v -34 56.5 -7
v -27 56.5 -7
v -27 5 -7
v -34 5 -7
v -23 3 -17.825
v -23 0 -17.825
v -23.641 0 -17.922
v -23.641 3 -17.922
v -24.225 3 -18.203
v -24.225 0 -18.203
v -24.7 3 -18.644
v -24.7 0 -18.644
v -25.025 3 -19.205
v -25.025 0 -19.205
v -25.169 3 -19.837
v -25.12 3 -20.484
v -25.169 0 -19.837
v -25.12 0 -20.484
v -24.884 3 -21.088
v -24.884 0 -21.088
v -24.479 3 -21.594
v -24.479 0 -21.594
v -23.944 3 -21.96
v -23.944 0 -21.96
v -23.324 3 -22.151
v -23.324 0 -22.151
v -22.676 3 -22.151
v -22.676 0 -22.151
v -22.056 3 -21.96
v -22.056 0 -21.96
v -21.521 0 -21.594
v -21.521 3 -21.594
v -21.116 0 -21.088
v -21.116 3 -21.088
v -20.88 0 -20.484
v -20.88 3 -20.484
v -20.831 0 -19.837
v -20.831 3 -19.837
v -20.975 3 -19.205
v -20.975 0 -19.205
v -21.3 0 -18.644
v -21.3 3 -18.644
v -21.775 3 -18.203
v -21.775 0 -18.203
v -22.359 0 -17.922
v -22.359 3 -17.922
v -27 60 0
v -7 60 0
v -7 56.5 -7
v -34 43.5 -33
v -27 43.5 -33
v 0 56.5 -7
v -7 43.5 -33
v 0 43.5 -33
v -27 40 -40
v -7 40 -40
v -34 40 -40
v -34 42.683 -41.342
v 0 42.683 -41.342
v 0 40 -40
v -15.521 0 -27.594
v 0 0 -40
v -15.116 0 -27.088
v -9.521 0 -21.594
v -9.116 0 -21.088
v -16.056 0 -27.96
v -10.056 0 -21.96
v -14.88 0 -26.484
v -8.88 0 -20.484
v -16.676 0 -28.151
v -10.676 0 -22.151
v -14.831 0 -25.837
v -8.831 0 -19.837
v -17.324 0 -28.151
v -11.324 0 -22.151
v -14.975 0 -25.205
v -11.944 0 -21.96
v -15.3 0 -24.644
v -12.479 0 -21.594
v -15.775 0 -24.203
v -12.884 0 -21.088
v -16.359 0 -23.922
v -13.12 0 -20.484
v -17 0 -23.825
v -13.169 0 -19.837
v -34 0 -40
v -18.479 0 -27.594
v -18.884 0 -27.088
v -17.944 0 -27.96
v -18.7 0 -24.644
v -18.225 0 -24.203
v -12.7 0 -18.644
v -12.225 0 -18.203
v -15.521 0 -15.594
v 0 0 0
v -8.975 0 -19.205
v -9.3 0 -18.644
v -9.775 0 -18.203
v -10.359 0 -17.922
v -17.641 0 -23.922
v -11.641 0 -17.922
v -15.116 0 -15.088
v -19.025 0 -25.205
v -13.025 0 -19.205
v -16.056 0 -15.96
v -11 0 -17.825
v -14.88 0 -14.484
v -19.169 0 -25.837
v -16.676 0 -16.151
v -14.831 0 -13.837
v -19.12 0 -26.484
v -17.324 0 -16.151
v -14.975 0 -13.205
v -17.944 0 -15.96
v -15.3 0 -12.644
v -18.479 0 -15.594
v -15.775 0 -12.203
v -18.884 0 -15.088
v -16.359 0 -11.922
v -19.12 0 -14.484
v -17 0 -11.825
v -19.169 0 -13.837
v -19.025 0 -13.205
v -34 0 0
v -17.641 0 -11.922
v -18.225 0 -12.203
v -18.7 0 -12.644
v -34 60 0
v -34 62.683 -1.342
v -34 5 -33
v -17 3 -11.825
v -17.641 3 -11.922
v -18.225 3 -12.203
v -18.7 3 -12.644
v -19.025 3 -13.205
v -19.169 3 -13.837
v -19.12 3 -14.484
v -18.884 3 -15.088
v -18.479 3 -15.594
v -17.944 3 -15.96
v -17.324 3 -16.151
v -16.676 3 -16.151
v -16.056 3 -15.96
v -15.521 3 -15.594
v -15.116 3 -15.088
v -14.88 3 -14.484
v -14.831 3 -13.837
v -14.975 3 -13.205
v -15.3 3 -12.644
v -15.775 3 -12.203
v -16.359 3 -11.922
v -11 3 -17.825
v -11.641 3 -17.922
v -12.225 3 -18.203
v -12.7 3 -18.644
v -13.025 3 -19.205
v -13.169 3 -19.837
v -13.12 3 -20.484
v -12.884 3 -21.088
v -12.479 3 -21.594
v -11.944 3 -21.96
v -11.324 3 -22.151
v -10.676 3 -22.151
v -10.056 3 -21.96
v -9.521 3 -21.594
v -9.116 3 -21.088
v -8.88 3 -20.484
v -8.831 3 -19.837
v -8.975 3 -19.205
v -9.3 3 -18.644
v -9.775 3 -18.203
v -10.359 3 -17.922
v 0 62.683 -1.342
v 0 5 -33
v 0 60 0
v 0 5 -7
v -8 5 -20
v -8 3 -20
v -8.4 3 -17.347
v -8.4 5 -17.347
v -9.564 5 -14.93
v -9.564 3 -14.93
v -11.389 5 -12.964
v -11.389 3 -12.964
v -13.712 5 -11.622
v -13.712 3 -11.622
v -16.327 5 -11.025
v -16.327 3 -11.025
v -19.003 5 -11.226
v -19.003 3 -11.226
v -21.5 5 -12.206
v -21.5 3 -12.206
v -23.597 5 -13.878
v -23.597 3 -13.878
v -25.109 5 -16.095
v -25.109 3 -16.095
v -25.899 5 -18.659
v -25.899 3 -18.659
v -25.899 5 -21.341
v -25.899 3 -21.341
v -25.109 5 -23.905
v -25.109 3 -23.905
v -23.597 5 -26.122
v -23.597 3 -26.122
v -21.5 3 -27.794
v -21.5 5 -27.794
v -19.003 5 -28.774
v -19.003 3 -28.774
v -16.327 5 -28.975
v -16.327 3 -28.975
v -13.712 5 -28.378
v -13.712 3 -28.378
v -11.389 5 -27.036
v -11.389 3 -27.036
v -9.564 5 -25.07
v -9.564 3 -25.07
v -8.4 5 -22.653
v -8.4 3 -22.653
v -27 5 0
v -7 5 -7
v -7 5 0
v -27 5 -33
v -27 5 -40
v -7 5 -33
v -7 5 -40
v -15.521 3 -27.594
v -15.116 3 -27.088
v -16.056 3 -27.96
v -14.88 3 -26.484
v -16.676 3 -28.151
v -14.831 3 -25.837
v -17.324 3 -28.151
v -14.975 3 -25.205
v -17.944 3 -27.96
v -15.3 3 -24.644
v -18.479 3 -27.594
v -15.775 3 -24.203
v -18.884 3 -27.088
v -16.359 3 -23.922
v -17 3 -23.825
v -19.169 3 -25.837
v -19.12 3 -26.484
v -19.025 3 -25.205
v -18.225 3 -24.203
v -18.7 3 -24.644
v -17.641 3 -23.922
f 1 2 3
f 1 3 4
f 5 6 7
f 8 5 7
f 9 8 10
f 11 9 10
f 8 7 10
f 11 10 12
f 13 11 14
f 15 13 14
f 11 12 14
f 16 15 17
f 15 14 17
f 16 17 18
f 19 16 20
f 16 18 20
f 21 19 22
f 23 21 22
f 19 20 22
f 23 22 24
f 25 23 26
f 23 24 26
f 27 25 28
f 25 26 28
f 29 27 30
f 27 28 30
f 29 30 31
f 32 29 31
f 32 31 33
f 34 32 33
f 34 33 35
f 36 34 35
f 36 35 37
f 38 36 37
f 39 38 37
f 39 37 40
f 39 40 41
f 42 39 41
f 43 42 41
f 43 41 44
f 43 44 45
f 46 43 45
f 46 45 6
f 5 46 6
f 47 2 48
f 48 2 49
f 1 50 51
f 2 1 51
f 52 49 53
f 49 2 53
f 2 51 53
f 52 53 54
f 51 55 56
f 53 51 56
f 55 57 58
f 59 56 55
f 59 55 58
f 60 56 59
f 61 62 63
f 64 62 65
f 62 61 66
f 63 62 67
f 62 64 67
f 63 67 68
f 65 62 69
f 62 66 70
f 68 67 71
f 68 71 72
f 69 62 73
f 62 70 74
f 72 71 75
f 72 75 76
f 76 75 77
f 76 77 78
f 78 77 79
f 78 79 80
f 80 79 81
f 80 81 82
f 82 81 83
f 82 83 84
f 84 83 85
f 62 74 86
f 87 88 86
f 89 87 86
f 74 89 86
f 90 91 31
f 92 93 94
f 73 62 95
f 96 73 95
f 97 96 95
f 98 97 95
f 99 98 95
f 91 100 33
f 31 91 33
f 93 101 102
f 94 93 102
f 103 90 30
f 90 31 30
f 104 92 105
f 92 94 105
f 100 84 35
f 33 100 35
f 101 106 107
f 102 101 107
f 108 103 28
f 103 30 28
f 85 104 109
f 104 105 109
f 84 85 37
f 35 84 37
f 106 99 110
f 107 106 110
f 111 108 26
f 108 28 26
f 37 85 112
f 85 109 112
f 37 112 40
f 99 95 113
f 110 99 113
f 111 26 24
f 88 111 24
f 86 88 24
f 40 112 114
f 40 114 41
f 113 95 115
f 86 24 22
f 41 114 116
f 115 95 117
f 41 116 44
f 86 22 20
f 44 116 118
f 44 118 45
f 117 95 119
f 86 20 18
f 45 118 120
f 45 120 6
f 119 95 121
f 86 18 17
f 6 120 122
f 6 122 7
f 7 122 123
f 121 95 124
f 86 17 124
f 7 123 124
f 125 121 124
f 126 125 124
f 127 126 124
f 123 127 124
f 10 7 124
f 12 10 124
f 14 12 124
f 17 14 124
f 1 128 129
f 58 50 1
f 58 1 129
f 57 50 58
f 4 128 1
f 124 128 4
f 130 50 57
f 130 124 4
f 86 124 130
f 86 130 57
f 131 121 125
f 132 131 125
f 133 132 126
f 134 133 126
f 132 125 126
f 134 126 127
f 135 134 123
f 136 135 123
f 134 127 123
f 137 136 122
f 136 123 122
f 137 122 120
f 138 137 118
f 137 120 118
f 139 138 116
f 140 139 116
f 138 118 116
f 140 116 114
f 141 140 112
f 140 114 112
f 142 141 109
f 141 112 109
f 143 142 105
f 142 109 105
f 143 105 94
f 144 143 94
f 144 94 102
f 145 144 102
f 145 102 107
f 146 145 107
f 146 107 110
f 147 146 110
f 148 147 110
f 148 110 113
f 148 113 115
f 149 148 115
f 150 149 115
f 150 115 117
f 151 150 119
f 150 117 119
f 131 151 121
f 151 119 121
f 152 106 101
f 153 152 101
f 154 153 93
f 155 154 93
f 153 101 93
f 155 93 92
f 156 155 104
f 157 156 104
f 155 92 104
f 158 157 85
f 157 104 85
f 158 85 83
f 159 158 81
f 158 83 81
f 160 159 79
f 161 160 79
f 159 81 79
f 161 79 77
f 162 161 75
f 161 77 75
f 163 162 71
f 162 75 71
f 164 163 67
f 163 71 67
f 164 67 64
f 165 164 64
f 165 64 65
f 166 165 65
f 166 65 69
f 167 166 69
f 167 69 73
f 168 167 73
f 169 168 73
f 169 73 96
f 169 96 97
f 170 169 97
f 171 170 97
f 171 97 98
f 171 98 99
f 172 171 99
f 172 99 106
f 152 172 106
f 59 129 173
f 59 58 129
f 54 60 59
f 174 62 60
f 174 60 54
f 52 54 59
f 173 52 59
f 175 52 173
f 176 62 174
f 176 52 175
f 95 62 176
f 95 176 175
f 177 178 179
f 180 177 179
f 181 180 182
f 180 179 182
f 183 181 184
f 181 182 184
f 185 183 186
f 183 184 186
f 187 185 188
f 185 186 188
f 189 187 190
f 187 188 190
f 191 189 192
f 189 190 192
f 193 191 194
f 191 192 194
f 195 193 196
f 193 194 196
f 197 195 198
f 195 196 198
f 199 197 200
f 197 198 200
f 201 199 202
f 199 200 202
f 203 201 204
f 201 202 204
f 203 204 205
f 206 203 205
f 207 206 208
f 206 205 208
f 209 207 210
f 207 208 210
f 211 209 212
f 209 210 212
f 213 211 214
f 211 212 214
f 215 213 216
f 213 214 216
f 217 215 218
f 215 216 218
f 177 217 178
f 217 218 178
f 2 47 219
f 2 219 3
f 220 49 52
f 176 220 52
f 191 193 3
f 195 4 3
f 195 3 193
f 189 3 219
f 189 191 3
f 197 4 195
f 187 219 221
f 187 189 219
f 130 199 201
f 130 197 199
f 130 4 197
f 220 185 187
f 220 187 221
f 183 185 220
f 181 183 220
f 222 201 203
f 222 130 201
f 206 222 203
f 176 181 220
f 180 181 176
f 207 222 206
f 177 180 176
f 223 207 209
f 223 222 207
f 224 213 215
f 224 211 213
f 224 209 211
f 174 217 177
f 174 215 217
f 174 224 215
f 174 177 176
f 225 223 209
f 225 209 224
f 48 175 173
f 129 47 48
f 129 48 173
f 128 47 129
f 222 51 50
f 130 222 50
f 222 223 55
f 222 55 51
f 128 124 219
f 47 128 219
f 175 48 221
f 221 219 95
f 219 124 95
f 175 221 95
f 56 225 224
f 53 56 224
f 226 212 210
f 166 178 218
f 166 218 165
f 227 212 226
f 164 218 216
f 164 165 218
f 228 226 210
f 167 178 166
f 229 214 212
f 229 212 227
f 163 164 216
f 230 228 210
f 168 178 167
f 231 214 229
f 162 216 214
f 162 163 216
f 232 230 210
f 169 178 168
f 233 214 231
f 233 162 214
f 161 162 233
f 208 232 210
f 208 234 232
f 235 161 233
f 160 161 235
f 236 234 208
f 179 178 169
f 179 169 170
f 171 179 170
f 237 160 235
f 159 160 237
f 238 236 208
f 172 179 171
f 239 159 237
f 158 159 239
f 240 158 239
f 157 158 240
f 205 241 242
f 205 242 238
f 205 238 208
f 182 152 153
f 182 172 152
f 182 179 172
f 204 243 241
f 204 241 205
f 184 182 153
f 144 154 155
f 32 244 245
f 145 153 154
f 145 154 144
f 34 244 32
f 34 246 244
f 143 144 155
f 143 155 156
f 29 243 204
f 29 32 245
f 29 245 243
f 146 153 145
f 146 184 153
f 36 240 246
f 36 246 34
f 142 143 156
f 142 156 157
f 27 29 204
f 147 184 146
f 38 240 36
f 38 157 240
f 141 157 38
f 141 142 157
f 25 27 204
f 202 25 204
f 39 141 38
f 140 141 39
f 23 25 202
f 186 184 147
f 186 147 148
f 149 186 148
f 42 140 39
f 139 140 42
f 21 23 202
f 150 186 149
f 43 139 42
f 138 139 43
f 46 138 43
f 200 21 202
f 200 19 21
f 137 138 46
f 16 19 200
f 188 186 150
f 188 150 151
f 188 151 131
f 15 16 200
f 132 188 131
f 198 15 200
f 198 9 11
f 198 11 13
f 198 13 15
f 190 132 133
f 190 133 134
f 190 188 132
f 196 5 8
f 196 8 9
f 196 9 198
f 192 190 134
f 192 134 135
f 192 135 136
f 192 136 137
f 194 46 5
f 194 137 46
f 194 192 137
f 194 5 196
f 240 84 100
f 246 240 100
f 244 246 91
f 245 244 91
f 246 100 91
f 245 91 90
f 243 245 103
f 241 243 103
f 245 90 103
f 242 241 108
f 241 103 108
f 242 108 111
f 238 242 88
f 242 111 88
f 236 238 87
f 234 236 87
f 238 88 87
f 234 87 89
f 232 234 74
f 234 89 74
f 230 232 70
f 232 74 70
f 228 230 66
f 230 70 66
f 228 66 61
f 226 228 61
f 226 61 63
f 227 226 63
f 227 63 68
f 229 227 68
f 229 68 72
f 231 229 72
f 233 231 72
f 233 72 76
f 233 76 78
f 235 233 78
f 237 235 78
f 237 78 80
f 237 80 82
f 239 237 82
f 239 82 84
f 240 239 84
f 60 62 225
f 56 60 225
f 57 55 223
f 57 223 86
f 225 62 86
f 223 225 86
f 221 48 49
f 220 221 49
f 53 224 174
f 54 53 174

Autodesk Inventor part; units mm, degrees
ref_plane "YZ Plane" through (0, 0, 0) normal (1, 0, 0) x (0, 1, 0)
ref_plane "XZ Plane" through (0, 0, 0) normal (0, 1, 0) x (-1, 0, 0)
ref_plane "XY Plane" through (0, 0, 0) normal (0, 0, 1) x (1, 0, 0)
sketch "Sketch1" plane through (0, 0, 0) normal (0, 1, 0) x (-1, 0, 0)
  line L0 (0, 0) -> (34, 0)
  line L1 (34, 0) -> (34, -40)
  line L2 (34, -40) -> (0, -40)
  line L3 (0, -40) -> (0, 0)
  line L4 (17, -40) -> (17, 0)
  line L5 (34, -20) -> (0, -20)
  dimension "d0" = 34
  dimension "d1" = 40
extrude "Extrusion1" add sketch "Sketch1" along normal blind 3
sketch "Sketch2" plane through (0, 3, 0) normal (0, 1, 0) x (1, 0, 0)
  line L0 (-34, 40) -> (-34, 0) projected
  line L1 (0, 0) -> (0, 40) projected
  line L2 (0, 40) -> (-34, 40) projected
  line L3 (-34, 0) -> (0, 0) projected
  circle A0 centre (-17, 20) radius 9
  line L4 (-34, 0) -> (0, 0)
  line L5 (0, 0) -> (0, 40)
  line L6 (0, 40) -> (-34, 40)
  line L7 (-34, 40) -> (-34, 0)
  dimension "d4" = 18
extrude "Extrusion2" add sketch "Sketch2" along normal blind 2
sketch "Sketch4" plane through (-17, 3, -20) normal (0, 1, 0) x (1, 0, 0)
  line L0 (0, 0) -> (0, 6)
  circle A0 centre (0, 6) radius 2.175
  circle A1 centre (0, -6) radius 2.175
  circle A2 centre (6, 0) radius 2.175
  circle A3 centre (-6, 0) radius 2.175
  point P0 (17, -20)
  dimension "d7" = 6
  dimension "d8" = 4.35
  dimension "d9" = 4.35
  dimension "d10" = 12
  dimension "d11" = 4.35
  dimension "d12" = 6
  dimension "d13" = 4.35
  dimension "d14" = 12
hole "Hole1" at (-23, 3, -20) at (-17, 3, -26) at (-11, 3, -20) at (-17, 3, -14) direction (0, -1, 0) diameter 4.35 end through all
sketch "Sketch5" plane through (0, 5, 0) normal (0, 1, 0) x (1, 0, 0)
  line L0 (0, 0) -> (-7, 0)
  line L1 (-7, 0) -> (-7, 7)
  line L2 (-7, 7) -> (0, 7)
  line L3 (0, 7) -> (0, 0)
  line L4 (0, 40) -> (-7, 40)
  line L5 (-7, 40) -> (-7, 33)
  line L6 (-7, 33) -> (0, 33)
  line L7 (0, 33) -> (0, 40)
  line L8 (0, 40) -> (-34, 40) projected
  line L9 (-34, 40) -> (-27, 40)
  line L10 (-27, 40) -> (-27, 33)
  line L11 (-27, 33) -> (-34, 33)
  line L12 (-34, 33) -> (-34, 40)
  line L13 (-34, 40) -> (-34, 0) projected
  line L14 (-34, 0) -> (-27, 0)
  line L15 (-27, 0) -> (-27, 7)
  line L16 (-27, 7) -> (-34, 7)
  line L17 (-34, 7) -> (-34, 0)
  dimension "d22" = 7
  dimension "d23" = 7
  dimension "d24" = 7
  dimension "d25" = 7
extrude "Extrusion3" add sketch "Sketch5" along normal blind 55
sketch "Sketch6" plane through (-34, 0, -40) normal (-1, 0, 0) x (0, 0, 1)
  line L0 (7, 60) -> (0, 60) projected
  line L1 (0, 60) -> (0, 40)
  line L2 (0, 0) -> (0, 60) projected
  line L3 (0, 40) -> (40, 60)
  line L4 (40, 60) -> (40, 40)
  line L5 (40, 5) -> (40, 60) projected
  line L6 (40, 60) -> (0, 60)
  point P0 (40, 0)
  dimension "d28" = 20
extrude "Extrusion4" cut sketch "Sketch6" against normal through all
sketch "Sketch7" plane through (-34, 43.5, -33) normal (0, 0.8944, -0.4472) x (1, 0, 0)
  line L0 (34, -10.0623) -> (34, -36.8951) projected
  line L1 (0, 25.7148) -> (0, -10.0623) projected
  line L2 (34, -36.8951) -> (0, -36.8951)
  line L3 (0, -36.8951) -> (0, 7.8262)
  line L4 (0, 7.8262) -> (34, 7.8262)
  line L5 (34, 7.8262) -> (34, -36.8951)
extrude "Extrusion5" add sketch "Sketch7" along normal blind 3
properties part number "cameraMount"
